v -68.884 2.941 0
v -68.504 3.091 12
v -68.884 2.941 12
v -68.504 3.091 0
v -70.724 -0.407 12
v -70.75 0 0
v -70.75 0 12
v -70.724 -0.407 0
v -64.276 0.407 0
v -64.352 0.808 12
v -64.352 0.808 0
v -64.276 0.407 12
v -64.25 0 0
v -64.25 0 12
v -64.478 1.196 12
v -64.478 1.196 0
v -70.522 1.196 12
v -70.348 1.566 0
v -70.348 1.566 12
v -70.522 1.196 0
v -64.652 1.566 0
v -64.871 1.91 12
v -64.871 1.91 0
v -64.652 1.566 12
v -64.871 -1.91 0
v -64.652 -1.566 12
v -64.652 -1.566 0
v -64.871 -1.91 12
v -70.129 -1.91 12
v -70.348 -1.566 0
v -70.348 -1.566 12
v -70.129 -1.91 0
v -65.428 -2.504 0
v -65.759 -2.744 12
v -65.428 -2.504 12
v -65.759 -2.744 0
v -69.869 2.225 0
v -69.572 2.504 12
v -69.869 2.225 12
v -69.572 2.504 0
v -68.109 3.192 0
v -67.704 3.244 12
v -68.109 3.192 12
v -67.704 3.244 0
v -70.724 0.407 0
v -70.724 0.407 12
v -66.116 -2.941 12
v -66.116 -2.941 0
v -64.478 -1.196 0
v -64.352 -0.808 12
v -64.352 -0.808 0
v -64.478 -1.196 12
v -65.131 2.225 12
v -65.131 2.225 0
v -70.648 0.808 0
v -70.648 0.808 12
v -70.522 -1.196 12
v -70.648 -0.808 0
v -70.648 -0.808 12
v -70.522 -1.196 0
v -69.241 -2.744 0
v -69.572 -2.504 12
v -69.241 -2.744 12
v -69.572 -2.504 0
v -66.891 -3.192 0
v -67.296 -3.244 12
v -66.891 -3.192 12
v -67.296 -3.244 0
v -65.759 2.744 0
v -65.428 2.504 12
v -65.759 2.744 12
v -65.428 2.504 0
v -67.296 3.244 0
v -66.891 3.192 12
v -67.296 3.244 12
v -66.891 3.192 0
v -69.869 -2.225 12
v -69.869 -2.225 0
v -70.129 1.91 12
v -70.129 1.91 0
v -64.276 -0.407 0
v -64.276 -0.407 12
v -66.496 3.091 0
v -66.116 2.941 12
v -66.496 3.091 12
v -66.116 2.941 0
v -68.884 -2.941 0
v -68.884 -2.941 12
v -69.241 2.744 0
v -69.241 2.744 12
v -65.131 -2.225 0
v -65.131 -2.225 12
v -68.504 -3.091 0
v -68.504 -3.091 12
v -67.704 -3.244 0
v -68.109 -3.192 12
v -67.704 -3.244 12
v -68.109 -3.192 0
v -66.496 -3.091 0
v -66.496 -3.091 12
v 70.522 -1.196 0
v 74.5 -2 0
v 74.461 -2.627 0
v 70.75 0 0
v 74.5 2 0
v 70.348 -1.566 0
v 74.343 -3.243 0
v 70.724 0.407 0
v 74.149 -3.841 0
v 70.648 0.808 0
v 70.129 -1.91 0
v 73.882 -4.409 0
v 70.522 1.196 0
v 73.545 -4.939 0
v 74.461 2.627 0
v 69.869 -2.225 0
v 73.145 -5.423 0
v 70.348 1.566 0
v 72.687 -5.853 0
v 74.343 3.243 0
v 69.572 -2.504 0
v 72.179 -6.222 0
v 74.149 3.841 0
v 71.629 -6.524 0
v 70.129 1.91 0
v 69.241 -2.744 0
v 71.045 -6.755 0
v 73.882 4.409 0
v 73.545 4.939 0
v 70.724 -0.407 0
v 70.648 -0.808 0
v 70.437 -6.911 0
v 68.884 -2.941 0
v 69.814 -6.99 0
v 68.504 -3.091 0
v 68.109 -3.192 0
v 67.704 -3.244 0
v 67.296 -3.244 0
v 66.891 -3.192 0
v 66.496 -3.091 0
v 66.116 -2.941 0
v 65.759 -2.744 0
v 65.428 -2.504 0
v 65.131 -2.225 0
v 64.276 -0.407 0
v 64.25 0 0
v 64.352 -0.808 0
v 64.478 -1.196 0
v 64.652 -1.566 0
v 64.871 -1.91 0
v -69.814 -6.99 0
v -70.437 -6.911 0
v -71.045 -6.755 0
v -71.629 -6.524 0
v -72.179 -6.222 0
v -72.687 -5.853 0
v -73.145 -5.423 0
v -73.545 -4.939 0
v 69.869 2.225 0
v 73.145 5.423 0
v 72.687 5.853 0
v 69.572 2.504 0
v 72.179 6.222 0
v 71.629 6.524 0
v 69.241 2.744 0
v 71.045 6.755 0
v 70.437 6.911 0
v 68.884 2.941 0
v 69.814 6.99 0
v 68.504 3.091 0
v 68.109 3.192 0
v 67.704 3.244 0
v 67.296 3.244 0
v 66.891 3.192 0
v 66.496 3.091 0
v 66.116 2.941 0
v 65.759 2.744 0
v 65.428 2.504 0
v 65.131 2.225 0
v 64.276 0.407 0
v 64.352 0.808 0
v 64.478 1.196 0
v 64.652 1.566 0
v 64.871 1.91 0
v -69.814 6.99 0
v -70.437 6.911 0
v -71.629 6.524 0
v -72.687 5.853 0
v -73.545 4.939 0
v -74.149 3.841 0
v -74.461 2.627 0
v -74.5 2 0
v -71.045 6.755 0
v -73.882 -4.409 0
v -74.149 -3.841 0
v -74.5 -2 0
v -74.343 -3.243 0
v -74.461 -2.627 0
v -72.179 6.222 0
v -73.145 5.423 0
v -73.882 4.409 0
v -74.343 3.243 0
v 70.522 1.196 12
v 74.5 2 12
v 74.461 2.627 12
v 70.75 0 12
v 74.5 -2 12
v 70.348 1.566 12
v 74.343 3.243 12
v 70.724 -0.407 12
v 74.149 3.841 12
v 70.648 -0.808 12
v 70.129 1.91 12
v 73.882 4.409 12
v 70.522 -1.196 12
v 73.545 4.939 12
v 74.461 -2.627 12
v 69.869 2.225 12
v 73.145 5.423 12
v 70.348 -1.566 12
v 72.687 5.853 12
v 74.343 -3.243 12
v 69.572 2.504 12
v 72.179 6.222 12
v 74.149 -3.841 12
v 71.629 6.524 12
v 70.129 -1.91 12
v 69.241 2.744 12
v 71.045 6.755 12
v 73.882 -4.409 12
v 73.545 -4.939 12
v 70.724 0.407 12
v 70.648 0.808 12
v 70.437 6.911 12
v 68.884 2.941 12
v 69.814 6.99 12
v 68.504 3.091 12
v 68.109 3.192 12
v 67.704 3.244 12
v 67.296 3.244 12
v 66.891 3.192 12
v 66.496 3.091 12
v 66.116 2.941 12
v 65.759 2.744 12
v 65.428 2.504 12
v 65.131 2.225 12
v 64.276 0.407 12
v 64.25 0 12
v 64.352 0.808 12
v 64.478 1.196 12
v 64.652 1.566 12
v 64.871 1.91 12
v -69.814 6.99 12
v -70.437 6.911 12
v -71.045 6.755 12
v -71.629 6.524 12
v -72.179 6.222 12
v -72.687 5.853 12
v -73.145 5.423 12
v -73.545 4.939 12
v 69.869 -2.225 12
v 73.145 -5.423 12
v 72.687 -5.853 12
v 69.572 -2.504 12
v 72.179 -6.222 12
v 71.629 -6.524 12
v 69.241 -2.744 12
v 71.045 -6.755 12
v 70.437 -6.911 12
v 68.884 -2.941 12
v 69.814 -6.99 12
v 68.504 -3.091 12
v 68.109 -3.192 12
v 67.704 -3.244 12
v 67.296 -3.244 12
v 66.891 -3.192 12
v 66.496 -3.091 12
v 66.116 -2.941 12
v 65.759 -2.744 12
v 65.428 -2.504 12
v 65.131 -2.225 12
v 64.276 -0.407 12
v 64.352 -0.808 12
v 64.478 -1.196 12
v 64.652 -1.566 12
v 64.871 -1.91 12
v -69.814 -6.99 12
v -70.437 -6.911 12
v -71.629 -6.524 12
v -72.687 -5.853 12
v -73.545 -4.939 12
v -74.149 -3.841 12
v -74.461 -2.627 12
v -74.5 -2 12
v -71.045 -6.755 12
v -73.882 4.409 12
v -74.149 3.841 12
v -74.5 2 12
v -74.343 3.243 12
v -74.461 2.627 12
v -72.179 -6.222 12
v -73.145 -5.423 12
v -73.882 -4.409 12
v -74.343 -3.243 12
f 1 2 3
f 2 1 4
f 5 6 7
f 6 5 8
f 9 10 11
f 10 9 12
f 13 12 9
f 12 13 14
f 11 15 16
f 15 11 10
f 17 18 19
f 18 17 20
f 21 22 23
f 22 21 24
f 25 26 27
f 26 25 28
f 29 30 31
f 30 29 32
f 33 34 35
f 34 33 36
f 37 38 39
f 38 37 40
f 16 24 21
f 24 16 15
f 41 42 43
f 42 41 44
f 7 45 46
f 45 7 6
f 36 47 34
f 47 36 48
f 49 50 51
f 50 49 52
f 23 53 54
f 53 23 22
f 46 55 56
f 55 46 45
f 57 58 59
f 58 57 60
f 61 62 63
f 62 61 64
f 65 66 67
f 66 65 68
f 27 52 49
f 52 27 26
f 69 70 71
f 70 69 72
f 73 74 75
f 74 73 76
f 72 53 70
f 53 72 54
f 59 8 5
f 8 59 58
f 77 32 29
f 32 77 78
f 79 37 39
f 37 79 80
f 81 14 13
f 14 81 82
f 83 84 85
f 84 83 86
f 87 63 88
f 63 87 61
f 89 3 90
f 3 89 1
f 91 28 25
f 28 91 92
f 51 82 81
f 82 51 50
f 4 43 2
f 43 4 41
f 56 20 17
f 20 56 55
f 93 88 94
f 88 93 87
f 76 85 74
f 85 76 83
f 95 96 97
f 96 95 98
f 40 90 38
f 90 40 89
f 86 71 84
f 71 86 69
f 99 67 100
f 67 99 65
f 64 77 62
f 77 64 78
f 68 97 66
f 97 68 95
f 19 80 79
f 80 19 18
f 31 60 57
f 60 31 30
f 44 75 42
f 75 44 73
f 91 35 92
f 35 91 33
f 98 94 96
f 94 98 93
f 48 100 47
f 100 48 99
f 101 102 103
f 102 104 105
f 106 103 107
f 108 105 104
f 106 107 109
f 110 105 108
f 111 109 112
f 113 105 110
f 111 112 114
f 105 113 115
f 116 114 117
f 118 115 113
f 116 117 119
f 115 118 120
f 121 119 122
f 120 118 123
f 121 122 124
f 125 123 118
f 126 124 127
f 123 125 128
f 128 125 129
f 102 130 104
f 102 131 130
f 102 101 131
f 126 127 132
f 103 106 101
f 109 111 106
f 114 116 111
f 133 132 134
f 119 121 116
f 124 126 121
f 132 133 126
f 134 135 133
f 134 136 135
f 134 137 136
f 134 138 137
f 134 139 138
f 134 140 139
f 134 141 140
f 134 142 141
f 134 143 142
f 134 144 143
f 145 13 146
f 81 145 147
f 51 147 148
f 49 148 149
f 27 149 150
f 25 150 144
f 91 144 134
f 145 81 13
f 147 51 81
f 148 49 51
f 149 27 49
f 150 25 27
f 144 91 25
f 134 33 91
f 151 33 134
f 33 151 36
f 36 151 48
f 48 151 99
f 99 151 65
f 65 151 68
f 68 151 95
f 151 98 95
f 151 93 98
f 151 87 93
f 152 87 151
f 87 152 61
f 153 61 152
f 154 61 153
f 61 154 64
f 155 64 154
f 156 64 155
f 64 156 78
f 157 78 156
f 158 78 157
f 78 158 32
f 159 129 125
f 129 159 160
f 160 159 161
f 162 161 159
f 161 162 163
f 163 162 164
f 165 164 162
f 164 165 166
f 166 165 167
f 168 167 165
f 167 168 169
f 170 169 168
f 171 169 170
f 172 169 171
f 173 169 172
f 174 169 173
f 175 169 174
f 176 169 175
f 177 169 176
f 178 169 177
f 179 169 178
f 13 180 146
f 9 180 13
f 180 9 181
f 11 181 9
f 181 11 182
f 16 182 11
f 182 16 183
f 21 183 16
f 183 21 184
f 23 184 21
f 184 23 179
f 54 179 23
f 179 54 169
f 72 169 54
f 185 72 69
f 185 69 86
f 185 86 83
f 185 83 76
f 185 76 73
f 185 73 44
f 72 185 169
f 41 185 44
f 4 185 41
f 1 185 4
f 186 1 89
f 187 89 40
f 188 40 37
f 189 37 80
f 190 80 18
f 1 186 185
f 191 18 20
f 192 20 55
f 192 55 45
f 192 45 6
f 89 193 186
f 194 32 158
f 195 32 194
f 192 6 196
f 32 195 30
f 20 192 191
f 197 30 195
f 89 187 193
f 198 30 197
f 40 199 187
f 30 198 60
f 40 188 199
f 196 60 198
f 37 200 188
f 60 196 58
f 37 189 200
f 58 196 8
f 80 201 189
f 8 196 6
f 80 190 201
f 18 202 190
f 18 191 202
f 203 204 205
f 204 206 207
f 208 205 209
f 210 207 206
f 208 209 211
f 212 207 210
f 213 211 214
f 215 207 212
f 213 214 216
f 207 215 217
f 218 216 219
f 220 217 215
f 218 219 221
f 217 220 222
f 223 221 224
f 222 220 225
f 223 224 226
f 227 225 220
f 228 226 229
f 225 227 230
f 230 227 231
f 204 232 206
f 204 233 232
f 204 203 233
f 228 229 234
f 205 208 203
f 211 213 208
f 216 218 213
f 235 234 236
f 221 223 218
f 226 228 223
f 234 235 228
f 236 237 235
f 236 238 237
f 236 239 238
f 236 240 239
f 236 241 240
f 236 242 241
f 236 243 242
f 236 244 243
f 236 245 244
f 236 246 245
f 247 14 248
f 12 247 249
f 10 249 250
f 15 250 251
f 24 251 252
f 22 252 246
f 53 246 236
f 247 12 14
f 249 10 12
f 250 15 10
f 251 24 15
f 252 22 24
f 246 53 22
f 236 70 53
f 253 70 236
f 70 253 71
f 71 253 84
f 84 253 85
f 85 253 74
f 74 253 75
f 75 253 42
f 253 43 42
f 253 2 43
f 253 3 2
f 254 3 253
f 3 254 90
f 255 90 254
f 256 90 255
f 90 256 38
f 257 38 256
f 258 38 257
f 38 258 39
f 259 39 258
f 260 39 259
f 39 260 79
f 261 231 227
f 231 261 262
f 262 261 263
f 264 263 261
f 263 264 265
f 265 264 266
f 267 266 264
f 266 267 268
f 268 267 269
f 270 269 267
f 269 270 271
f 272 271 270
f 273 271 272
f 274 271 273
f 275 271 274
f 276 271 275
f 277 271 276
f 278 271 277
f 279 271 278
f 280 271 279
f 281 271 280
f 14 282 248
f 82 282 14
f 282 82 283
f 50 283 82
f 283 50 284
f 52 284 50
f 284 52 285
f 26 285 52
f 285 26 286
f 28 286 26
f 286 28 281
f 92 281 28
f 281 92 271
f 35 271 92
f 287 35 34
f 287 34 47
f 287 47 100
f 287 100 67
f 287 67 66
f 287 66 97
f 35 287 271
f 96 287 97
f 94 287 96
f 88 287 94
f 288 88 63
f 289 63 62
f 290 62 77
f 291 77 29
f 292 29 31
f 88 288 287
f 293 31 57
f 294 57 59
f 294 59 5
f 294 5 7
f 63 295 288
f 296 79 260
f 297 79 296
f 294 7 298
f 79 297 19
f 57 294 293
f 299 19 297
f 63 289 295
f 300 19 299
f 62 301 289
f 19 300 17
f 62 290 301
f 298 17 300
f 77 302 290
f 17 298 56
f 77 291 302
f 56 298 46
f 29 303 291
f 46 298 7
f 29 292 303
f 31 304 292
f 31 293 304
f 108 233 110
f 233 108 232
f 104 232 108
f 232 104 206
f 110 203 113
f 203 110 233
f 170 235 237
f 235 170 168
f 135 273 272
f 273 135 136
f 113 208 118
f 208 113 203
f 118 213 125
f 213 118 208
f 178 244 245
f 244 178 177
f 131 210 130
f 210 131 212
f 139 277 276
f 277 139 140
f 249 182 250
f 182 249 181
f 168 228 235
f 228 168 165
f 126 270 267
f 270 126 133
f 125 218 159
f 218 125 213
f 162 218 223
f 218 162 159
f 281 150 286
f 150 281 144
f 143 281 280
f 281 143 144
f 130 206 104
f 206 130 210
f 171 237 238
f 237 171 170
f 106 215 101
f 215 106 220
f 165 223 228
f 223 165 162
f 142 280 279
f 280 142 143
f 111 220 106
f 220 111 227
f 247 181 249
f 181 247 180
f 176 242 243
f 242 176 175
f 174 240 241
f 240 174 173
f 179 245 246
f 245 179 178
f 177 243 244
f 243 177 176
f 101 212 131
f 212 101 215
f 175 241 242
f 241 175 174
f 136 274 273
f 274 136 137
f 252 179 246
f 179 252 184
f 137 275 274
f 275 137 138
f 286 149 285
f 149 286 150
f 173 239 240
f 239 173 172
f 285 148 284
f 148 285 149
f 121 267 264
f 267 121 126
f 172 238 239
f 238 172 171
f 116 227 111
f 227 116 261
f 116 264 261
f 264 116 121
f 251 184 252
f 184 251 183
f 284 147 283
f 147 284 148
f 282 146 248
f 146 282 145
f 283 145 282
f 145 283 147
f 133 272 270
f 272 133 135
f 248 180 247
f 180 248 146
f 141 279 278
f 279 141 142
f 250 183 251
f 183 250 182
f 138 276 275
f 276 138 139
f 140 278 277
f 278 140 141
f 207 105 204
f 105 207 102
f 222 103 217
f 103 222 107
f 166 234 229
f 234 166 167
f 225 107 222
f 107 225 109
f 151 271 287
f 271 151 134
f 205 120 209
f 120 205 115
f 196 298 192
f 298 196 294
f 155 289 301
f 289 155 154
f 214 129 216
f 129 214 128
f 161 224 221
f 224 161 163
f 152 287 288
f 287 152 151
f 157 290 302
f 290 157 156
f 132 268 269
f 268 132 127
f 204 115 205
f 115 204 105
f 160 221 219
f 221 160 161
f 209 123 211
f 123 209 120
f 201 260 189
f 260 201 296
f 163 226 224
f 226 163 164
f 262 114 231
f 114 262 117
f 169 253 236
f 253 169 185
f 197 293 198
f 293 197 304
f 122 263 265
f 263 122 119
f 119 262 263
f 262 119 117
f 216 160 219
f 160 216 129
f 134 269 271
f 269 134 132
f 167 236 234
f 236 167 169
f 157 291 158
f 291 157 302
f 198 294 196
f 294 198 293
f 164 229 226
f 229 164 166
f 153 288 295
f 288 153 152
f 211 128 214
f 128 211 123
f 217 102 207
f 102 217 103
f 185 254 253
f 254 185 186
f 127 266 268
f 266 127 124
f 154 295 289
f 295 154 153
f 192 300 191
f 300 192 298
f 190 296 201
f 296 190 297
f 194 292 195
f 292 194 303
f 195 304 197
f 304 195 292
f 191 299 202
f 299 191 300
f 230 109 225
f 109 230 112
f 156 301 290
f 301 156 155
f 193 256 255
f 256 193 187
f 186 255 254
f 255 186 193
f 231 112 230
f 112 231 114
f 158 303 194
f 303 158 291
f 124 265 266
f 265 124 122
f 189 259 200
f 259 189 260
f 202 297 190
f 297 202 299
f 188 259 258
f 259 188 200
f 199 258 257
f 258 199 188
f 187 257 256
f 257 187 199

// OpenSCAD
$fn = 50;


difference() {
	union() {
		hull() {
			translate(v = [-69.5000000000, 2.0000000000, 0]) {
				cylinder(h = 12, r = 5);
			}
			translate(v = [69.5000000000, 2.0000000000, 0]) {
				cylinder(h = 12, r = 5);
			}
			translate(v = [-69.5000000000, -2.0000000000, 0]) {
				cylinder(h = 12, r = 5);
			}
			translate(v = [69.5000000000, -2.0000000000, 0]) {
				cylinder(h = 12, r = 5);
			}
		}
	}
	union() {
		translate(v = [-67.5000000000, 0.0000000000, 0]) {
			cylinder(h = 12, r = 3.2500000000);
		}
		translate(v = [67.5000000000, 0.0000000000, 0]) {
			cylinder(h = 12, r = 3.2500000000);
		}
		translate(v = [-67.5000000000, 0.0000000000, 0]) {
			cylinder(h = 12, r = 1.8000000000);
		}
		translate(v = [67.5000000000, 0.0000000000, 0]) {
			cylinder(h = 12, r = 1.8000000000);
		}
		translate(v = [-67.5000000000, 0.0000000000, 0]) {
			cylinder(h = 12, r = 1.8000000000);
		}
		translate(v = [67.5000000000, 0.0000000000, 0]) {
			cylinder(h = 12, r = 1.8000000000);
		}
		translate(v = [-67.5000000000, 0.0000000000, 0]) {
			cylinder(h = 12, r = 1.8000000000);
		}
		translate(v = [67.5000000000, 0.0000000000, 0]) {
			cylinder(h = 12, r = 1.8000000000);
		}
	}
}
